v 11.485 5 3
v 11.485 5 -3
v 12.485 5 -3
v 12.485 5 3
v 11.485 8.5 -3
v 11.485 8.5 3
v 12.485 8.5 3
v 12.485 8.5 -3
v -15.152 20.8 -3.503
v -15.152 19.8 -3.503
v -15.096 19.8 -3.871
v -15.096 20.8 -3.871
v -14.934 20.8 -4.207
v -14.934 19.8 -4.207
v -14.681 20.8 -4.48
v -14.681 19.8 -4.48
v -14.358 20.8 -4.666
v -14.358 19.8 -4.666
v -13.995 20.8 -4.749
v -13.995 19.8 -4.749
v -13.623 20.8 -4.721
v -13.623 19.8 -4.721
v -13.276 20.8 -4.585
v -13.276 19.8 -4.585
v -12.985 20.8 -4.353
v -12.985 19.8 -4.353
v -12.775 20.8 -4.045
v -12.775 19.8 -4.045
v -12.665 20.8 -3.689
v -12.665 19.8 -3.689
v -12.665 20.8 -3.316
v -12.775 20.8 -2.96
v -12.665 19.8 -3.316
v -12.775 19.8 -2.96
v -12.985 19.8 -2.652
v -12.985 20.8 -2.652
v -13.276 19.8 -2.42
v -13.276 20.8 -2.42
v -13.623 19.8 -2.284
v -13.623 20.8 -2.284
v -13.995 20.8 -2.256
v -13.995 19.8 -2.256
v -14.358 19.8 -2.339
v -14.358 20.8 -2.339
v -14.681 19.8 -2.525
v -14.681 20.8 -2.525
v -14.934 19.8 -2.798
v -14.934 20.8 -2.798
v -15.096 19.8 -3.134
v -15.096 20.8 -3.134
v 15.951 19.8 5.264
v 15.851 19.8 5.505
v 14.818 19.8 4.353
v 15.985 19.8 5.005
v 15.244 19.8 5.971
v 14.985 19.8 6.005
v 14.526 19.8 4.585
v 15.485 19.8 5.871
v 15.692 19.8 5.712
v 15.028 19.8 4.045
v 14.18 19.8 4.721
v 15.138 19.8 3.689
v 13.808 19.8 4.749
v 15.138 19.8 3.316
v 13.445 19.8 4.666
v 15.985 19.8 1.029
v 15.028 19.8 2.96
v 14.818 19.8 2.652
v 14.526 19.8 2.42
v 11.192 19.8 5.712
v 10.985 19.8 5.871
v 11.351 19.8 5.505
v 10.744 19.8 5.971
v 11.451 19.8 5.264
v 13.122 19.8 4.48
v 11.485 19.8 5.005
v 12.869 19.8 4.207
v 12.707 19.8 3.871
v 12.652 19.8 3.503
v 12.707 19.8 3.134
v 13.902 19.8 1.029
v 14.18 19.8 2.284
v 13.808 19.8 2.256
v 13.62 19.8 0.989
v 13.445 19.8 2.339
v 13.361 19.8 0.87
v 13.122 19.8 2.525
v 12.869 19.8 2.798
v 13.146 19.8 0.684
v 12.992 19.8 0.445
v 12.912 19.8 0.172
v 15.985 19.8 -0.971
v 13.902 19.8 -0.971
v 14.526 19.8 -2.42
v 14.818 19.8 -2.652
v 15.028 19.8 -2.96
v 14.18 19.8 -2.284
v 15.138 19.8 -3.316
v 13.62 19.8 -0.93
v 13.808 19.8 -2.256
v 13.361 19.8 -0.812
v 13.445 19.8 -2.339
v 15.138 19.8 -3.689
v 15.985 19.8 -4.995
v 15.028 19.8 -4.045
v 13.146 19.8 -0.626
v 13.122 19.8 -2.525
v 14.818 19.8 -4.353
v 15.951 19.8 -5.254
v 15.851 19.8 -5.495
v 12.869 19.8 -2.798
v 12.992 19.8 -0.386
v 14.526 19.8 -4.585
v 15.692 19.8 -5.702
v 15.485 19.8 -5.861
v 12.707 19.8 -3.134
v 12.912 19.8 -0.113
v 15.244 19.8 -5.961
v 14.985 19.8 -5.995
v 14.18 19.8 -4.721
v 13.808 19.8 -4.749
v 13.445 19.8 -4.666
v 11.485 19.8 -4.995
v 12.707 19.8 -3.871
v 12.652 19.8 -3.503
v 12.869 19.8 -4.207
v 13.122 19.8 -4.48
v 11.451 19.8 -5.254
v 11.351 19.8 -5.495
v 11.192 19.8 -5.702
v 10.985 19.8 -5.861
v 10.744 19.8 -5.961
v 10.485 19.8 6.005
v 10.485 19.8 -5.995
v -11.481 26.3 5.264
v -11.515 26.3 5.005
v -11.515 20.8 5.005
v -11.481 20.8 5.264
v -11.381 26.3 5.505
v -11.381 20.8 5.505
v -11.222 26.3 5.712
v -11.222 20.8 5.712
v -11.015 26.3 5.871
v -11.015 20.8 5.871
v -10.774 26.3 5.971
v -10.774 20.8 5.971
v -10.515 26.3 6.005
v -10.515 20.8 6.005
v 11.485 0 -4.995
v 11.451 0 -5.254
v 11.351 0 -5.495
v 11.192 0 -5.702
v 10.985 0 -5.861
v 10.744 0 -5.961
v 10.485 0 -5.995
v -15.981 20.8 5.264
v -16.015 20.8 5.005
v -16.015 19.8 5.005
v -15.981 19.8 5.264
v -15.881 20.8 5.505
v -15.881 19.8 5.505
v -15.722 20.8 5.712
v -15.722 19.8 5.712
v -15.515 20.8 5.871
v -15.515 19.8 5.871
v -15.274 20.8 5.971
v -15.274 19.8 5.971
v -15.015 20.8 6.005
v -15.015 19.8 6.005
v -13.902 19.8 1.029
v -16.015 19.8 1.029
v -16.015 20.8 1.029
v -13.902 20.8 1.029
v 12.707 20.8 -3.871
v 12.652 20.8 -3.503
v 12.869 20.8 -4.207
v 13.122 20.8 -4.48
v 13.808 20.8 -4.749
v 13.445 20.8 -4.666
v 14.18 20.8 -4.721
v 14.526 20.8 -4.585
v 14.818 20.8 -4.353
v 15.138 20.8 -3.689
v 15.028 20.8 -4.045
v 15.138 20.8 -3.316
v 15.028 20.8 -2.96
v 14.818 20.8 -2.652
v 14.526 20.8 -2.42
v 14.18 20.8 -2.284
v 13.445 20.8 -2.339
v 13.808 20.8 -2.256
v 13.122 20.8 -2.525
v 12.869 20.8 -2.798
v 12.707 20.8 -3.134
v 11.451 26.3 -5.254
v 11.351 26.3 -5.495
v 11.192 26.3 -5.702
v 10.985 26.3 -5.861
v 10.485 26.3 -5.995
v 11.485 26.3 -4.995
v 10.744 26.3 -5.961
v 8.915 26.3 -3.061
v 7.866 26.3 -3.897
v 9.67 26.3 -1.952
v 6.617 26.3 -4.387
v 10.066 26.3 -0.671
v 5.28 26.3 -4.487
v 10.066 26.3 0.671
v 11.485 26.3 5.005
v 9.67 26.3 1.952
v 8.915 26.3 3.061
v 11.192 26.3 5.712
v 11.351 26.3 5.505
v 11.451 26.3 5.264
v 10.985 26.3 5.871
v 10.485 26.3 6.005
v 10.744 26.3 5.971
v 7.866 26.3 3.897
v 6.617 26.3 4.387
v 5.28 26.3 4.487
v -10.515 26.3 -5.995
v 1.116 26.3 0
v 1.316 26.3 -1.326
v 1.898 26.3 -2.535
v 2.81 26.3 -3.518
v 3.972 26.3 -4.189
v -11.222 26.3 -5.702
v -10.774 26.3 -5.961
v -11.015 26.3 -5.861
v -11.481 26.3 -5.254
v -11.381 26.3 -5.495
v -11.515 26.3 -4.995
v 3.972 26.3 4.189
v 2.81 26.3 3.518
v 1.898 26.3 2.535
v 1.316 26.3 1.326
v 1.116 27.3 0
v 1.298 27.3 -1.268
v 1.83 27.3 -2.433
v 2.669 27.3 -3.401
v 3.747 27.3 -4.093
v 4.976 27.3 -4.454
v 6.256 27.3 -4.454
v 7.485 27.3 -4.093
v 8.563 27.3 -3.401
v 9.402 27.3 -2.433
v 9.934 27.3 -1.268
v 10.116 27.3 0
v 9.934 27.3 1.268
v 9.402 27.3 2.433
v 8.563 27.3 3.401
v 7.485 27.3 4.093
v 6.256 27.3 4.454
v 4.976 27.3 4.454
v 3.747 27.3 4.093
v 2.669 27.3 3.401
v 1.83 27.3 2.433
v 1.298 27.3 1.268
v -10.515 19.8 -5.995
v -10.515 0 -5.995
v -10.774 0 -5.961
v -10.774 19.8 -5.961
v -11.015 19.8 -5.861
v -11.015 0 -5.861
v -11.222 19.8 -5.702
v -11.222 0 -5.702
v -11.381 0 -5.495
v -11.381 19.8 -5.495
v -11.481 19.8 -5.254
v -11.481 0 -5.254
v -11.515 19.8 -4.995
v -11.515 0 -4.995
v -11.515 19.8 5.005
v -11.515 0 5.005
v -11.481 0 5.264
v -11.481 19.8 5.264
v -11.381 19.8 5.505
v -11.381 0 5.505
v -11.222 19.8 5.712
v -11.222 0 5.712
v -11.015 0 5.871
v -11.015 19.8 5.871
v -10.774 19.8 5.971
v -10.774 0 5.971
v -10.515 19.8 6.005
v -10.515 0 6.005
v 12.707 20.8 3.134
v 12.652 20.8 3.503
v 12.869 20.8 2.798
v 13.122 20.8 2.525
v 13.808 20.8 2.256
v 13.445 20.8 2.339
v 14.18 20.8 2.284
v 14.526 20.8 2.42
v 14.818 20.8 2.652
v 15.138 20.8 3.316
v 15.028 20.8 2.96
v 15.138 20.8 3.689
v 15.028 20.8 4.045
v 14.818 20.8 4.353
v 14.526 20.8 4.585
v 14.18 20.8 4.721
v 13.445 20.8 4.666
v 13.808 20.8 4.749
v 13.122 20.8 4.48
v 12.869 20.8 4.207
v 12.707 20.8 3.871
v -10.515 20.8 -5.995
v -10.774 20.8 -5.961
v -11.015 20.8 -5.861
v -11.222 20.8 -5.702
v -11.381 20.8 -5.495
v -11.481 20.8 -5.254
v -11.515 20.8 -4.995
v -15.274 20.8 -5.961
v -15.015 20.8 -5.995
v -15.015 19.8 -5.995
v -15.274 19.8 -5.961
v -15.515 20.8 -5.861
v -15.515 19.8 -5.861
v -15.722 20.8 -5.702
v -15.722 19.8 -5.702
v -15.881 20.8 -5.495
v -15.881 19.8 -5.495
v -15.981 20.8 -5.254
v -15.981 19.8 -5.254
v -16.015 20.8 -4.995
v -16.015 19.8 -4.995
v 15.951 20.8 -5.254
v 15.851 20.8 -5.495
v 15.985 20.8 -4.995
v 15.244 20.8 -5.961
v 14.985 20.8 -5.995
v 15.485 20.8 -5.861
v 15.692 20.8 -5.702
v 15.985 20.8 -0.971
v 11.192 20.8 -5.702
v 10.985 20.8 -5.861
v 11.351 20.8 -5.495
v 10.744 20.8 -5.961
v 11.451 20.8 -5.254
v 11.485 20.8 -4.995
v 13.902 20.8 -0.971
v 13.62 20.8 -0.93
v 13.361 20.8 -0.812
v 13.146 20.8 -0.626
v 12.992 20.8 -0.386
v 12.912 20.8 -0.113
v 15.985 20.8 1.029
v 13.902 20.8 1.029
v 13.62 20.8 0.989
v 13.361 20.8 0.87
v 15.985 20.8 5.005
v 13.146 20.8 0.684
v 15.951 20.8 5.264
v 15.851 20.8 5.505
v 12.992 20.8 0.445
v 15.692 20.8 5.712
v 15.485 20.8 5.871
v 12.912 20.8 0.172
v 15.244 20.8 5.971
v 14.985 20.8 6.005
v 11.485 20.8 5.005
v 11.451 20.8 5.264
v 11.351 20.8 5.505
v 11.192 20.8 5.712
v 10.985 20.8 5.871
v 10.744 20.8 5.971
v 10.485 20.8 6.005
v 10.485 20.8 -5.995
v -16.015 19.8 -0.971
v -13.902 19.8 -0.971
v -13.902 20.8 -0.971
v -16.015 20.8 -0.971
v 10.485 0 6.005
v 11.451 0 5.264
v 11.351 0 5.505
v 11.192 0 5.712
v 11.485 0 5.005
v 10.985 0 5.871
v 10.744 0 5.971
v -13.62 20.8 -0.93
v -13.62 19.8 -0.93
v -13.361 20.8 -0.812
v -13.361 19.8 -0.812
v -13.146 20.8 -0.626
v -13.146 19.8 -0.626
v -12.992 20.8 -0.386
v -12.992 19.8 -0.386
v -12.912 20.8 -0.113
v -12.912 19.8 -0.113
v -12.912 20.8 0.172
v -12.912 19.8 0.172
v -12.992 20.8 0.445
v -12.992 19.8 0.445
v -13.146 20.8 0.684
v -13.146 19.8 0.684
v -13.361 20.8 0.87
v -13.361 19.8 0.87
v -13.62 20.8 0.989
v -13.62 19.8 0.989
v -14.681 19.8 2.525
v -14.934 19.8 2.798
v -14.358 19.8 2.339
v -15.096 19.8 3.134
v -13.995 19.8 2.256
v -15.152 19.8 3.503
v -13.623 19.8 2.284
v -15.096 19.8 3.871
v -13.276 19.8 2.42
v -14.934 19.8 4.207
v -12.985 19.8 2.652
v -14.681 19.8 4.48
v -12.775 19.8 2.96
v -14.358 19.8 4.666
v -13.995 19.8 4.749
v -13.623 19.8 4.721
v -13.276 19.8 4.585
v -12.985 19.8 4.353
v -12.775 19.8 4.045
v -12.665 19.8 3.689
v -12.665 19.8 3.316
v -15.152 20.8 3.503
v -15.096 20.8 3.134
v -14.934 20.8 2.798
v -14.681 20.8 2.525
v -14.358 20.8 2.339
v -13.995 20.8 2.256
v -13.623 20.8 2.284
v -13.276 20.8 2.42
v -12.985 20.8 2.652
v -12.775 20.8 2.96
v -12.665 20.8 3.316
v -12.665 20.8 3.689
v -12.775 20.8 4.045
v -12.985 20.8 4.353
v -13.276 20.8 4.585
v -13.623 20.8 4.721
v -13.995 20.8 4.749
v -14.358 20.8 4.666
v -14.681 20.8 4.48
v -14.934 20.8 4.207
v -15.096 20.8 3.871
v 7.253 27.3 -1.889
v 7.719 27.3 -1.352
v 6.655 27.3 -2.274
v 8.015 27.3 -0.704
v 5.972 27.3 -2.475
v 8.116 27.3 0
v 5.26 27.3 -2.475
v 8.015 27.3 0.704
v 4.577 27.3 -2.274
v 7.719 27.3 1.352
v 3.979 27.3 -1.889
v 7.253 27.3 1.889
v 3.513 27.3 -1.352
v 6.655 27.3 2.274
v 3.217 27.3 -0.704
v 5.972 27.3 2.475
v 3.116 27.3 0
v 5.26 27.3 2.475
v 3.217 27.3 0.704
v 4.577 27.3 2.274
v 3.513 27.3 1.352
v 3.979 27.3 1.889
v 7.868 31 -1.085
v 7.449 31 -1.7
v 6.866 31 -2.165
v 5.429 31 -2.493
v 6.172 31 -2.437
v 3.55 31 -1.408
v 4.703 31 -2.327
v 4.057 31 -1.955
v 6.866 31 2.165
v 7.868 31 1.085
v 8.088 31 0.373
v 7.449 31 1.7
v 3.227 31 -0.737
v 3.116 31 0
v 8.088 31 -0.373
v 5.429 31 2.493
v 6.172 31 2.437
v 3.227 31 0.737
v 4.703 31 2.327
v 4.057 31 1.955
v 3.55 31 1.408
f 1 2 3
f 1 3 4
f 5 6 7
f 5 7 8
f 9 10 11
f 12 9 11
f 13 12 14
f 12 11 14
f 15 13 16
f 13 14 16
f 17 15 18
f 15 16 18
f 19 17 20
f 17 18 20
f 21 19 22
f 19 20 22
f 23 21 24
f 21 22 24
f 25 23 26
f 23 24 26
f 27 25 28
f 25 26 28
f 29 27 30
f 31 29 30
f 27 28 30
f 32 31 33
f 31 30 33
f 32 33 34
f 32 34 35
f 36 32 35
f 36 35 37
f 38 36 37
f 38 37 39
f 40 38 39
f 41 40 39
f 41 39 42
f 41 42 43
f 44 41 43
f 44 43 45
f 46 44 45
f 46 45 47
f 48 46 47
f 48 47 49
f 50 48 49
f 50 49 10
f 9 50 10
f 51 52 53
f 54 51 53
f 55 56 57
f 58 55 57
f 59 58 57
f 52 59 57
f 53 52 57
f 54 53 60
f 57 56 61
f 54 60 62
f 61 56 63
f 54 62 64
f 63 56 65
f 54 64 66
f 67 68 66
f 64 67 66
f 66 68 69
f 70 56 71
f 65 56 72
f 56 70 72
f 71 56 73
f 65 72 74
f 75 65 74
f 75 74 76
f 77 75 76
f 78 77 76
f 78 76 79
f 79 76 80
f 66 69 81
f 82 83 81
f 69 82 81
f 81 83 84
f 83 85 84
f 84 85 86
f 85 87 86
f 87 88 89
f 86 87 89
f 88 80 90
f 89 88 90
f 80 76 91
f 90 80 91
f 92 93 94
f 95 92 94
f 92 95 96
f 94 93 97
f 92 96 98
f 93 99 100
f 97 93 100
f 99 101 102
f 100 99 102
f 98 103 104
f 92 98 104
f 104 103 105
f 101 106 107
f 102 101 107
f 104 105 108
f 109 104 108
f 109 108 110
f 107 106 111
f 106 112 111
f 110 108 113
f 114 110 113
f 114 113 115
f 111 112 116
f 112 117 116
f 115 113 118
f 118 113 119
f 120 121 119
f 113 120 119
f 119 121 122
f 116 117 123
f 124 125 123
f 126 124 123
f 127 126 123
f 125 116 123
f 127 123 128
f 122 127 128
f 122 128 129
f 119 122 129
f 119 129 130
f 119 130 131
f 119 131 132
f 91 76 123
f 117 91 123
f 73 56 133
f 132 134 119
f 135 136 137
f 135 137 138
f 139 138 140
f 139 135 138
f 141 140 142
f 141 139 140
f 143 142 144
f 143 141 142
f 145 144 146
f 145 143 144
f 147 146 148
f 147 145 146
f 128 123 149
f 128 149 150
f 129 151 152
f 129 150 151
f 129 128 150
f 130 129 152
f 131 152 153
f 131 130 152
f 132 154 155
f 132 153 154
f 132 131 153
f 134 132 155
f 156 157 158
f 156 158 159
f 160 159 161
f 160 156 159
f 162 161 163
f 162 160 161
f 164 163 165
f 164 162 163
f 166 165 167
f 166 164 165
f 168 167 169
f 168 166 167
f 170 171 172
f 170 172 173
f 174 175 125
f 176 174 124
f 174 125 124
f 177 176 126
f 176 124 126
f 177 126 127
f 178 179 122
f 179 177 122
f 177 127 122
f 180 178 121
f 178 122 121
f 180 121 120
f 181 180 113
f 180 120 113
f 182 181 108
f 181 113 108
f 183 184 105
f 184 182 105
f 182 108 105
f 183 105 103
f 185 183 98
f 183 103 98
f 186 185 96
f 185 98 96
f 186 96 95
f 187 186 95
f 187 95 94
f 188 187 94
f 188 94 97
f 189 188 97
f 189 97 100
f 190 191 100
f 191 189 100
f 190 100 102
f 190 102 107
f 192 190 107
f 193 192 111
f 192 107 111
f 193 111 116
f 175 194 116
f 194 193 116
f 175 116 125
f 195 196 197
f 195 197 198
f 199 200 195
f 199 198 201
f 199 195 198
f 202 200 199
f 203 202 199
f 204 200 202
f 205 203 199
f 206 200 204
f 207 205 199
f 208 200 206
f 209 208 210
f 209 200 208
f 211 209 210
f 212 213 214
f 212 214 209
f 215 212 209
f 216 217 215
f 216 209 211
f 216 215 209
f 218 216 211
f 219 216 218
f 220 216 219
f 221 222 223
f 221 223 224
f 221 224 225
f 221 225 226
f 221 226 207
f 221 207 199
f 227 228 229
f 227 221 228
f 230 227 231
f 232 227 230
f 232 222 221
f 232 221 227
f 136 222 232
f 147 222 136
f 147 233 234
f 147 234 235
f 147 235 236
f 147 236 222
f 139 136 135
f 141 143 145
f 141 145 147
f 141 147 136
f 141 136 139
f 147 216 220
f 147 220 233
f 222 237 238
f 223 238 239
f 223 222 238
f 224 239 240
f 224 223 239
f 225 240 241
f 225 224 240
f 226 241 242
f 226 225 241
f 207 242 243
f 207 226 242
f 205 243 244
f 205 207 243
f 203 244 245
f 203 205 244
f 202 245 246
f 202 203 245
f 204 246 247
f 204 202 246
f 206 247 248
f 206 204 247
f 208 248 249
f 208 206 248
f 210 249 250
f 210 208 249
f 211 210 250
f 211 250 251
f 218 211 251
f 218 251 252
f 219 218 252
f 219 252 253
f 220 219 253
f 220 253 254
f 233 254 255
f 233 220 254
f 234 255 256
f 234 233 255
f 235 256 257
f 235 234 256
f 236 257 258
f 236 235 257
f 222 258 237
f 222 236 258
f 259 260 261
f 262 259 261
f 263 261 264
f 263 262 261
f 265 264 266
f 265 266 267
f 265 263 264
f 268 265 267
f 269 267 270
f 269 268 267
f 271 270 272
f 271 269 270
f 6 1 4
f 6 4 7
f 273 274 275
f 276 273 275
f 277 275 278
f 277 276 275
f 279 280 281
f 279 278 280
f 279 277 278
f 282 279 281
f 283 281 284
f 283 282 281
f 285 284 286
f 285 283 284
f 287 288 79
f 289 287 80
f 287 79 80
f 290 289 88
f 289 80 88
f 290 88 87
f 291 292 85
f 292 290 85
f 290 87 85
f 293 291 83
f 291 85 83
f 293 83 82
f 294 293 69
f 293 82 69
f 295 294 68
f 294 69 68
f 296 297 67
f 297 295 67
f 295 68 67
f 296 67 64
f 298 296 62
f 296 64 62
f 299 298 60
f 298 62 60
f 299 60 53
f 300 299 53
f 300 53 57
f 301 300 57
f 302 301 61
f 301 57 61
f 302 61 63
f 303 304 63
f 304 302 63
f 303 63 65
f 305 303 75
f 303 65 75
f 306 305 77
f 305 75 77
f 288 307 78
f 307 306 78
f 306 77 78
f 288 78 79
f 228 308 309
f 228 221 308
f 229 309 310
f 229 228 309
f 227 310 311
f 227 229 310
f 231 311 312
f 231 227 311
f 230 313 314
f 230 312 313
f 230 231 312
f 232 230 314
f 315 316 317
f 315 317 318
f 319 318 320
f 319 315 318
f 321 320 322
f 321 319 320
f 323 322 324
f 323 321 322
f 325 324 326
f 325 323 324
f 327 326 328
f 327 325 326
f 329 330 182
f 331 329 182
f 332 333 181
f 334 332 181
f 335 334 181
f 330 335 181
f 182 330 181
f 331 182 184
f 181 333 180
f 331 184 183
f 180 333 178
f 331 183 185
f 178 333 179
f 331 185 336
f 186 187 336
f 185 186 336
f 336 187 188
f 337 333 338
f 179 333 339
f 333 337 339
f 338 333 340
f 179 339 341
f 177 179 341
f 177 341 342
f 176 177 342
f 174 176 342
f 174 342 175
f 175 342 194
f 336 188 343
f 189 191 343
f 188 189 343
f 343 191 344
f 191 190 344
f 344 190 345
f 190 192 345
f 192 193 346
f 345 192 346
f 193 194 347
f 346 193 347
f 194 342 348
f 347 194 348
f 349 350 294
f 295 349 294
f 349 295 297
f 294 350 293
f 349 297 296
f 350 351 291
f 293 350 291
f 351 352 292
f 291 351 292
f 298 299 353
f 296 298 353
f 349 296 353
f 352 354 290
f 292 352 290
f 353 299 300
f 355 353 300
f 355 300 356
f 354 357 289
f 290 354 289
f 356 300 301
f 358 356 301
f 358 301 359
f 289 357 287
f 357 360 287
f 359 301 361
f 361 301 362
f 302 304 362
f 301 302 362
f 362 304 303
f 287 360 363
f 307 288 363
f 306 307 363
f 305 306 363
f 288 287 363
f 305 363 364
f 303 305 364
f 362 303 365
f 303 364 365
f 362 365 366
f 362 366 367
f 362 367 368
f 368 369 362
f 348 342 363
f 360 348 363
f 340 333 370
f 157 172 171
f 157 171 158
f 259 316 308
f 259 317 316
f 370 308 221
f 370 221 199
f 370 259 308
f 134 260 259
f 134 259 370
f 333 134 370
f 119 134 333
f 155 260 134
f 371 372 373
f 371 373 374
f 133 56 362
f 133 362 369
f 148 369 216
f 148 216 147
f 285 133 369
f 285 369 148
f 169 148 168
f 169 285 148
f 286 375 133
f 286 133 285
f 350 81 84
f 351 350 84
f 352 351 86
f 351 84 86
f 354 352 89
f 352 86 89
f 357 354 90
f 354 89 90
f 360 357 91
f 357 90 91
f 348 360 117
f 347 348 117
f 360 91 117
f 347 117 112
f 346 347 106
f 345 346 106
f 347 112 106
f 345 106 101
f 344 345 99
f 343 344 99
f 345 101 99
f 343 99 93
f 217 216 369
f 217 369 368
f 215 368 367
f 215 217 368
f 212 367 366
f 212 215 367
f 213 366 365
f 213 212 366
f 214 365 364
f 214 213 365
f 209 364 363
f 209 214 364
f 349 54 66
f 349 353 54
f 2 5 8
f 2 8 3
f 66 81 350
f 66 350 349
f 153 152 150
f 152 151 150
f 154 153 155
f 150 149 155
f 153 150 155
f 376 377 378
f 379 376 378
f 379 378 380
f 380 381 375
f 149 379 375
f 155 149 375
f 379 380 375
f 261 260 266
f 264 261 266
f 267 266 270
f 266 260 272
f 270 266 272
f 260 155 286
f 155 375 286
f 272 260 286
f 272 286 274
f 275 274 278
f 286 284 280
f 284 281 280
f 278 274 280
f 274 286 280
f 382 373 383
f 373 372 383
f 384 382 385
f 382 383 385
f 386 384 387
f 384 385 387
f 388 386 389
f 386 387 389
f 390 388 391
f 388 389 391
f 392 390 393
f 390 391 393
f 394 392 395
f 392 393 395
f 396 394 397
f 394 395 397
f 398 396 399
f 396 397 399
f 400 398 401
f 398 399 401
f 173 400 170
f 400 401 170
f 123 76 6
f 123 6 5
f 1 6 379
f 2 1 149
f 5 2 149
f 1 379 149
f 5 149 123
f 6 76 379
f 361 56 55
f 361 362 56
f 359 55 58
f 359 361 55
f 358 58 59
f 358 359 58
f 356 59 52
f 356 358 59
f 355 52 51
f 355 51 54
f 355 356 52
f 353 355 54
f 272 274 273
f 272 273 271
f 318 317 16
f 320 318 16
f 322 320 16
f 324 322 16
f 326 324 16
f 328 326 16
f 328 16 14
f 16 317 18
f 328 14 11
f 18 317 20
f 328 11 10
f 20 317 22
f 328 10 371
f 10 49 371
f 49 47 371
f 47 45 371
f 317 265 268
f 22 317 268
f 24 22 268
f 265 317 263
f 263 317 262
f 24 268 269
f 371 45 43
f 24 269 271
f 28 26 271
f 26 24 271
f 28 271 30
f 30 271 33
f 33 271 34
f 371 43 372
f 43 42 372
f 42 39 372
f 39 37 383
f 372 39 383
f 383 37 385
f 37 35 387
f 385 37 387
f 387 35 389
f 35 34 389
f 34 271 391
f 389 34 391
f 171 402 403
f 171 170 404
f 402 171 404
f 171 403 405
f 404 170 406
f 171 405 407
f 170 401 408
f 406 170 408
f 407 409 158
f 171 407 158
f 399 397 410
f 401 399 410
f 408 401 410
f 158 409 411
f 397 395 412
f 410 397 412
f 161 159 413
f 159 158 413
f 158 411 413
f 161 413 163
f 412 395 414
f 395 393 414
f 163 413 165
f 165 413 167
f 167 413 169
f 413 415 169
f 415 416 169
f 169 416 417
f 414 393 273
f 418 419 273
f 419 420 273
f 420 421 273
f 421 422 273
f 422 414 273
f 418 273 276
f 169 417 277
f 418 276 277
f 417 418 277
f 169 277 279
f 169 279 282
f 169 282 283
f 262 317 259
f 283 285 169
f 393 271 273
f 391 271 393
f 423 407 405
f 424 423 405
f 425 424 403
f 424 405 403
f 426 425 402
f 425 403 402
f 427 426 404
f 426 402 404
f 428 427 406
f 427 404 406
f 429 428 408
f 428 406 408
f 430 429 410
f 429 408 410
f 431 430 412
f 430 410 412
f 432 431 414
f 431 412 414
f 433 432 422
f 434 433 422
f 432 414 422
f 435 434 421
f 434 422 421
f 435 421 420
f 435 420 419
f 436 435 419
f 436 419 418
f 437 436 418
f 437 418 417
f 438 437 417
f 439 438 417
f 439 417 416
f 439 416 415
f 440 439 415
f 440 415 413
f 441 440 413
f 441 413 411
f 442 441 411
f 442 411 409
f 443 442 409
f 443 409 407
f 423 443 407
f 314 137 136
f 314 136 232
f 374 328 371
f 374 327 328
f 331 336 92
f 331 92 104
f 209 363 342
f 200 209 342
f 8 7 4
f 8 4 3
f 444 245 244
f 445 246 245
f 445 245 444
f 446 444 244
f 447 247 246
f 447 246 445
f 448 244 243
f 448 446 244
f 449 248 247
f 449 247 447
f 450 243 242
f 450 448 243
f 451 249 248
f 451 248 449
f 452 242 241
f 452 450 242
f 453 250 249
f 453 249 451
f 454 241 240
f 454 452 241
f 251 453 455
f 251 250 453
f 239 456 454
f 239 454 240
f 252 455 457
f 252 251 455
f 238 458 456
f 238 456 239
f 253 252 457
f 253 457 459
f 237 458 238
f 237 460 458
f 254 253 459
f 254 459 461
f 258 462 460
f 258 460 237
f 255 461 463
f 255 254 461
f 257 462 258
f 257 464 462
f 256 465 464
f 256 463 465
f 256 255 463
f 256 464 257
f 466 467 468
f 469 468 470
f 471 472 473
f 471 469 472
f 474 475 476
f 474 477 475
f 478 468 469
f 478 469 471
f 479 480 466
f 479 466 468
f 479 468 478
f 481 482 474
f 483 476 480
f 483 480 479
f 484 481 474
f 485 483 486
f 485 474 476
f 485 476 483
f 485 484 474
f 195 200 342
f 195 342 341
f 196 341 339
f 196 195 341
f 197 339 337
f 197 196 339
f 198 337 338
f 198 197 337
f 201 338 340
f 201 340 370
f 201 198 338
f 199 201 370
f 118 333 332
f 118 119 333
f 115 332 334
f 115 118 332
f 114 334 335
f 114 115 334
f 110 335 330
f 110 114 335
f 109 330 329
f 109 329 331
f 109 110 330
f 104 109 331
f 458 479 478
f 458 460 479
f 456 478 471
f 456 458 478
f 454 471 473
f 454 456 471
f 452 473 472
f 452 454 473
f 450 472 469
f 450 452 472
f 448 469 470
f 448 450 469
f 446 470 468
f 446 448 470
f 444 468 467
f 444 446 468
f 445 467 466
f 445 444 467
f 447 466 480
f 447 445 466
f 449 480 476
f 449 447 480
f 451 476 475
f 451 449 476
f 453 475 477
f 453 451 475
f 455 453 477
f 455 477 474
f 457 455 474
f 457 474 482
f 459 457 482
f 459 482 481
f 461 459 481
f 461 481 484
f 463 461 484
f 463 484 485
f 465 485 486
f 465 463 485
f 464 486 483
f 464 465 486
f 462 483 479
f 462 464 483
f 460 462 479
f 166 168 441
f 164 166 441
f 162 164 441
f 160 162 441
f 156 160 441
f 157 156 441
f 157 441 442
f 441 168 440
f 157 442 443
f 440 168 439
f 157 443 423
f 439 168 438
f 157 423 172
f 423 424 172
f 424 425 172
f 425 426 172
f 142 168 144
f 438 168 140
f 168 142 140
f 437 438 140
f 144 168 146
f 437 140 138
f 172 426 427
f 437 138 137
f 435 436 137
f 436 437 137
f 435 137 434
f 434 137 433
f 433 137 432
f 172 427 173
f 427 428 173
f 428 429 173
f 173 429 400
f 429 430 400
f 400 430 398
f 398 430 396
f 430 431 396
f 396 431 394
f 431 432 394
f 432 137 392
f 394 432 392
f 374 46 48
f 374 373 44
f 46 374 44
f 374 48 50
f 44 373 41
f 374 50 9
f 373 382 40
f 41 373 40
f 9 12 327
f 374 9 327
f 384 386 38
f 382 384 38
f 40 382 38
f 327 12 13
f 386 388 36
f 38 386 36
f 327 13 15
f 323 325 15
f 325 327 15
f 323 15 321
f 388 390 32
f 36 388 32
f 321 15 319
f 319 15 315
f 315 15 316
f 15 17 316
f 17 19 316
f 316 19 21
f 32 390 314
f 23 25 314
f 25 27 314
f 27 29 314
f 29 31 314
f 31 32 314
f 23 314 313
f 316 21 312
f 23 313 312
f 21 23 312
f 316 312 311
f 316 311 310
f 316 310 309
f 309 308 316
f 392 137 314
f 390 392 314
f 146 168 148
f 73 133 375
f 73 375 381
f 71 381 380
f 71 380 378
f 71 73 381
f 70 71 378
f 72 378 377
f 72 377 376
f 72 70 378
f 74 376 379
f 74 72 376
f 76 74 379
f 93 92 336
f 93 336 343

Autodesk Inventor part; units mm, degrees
ref_plane "YZ Plane" through (0, 0, 0) normal (1, 0, 0) x (0, 1, 0)
ref_plane "XZ Plane" through (0, 0, 0) normal (0, 1, 0) x (-1, 0, 0)
ref_plane "XY Plane" through (0, 0, 0) normal (0, 0, 1) x (1, 0, 0)
sketch "Sketch1" plane through (0, 0, 0) normal (0, 0, 1) x (1, 0, 0)
  line L0 (-35.5537, 46.3091) -> (69.62, 46.3091) construction
  line L1 (69.62, 46.3091) -> (69.62, -40.915) construction
  line L2 (69.62, -40.915) -> (-35.5537, -40.915) construction
  line L3 (-35.5537, -40.915) -> (-35.5537, 46.3091) construction
  line L4 (-11.5, -3.1187) -> (11.5, -3.1187)
  point P0 (0, 0)
  point P1 (0, 0)
  dimension "d19" = 23
sketch "Sketch5" plane through (0, 0, 0) normal (0, 1, 0) x (-1, 0, 0)
  line L0 (-51.6883, 69.5392) -> (52.6581, 69.5392) construction
  line L1 (52.6581, 69.5392) -> (52.6581, -16.9988) construction
  line L2 (52.6581, -16.9988) -> (-51.6883, -16.9988) construction
  line L3 (-51.6883, -16.9988) -> (-51.6883, 69.5392) construction
  line L4 (16, 8.395) -> (-16, 8.395)
  circle A0 centre (-5.616, 0) radius 2.5
  circle A1 centre (-5.616, 0) radius 4.5
  circle A2 centre (-13.9015, 3.5026) radius 1.25
  line L5 (-5.616, 0) -> (-20.9236, 0)
  circle A3 centre (-13.9015, -3.5026) radius 1.25
  line L6 (0, 0) -> (0, -9.2667)
  circle A4 centre (13.9015, 3.5026) radius 1.25
  circle A5 centre (13.9015, -3.5026) radius 1.25
  line L7 (13.9015, -3.5026) -> (13.9015, 3.5026)
  arc A6 (13.9015, 1.0292) -> (13.9015, -0.9708) centre (13.9015, 0.0292) ccw
  line L8 (13.9015, -0.9708) -> (16.5074, -0.9708)
  line L9 (16.5074, 1.0292) -> (13.9015, 1.0292)
  line L10 (16.5074, -0.9708) -> (16.5074, 1.0292)
  point P0 (0, 8.395)
  dimension "d30" = 32
  dimension "d57" = 9
  dimension "d58" = 5
  dimension "d63" = 2.5
  dimension "d83" = 2
  dimension "d84" = 1
sketch "Sketch6" plane through (0, 0, 0) normal (0, 1, 0) x (-1, 0, 0)
  line L0 (11.515, 6.0048) -> (11.515, -5.9952)
  line L1 (11.515, 0.0048) -> (-11.485, 0.0048)
  line L2 (11.515, -5.9952) -> (11.515, 6.0048)
  line L3 (-11.485, 6.0048) -> (-11.485, -5.9952)
  line L4 (11.515, -5.9952) -> (-11.485, -5.9952)
  line L5 (-11.485, 6.0048) -> (11.515, 6.0048)
  point P0 (0, 0)
  point P1 (9.3248, 11.448)
  point P2 (-11.485, 0.0048)
  dimension "d42" = 12
  dimension "d43" = 23
  dimension "d44" = 12
extrude "Extrusion1" add sketch "Sketch6" along normal blind 26.3
extrude "Extrusion2" add sketch "Sketch5" along normal blind 1 from surface at 26.3 contours A0 | A1
sketch "Sketch7" plane through (-11.515, 0, -5.9952) normal (-1, 0, 0) x (0, 0, 1)
  line L0 (5.9952, 0) -> (5.9952, 19.8)
  line L1 (5.9952, 19.8) -> (5.9952, 20.8)
  line L2 (0, 0) -> (0, 26.3) projected
  line L3 (0, 19.8) -> (12, 19.8)
  line L4 (12, 0) -> (12, 26.3) projected
  line L5 (12, 20.8) -> (0, 20.8)
  line L6 (0, 20.8) -> (0, 19.8)
  dimension "d49" = 19.8
  dimension "d50" = 1
extrude "Extrusion3" add sketch "Sketch7" along normal blind 4.5
sketch "Sketch8" plane through (11.485, 0, 6.0048) normal (1, 0, 0) x (0, 0, -1)
  line L0 (6.0048, 0) -> (6.0048, 19.8)
  line L1 (6.0048, 19.8) -> (6.0048, 20.8)
  line L2 (0, 0) -> (0, 26.3) projected
  line L3 (0, 19.7999) -> (12, 19.7999)
  line L4 (12, 20.8) -> (12, 19.8) projected
  line L5 (12, 19.7999) -> (12, 20.8)
  line L6 (12, 20.8) -> (0, 20.8)
  line L7 (0, 20.8) -> (0, 19.7999)
  dimension "d53" = 19.8
  dimension "d54" = 1
extrude "Extrusion4" add sketch "Sketch8" along normal blind 4.5
extrude "Extrusion5" add sketch "Sketch5" along normal blind 3.7 from surface at 27.3 contours A0
fillet "Fillet1" radius 1 12 edges at (11.485, 9.8999, 6.0048) (11.485, 9.8999, -5.9952) (-11.515, 9.9, -5.9952) (-11.515, 23.55, -5.9952) (-11.515, 23.55, 6.0048) (-11.515, 9.9, 6.0048) (-16.015, 20.3, 6.0048) (-16.015, 20.3, -5.9952) (11.485, 23.55, -5.9952) (15.985, 20.2999, -5.9952) (15.985, 20.2999, 6.0048) (11.485, 23.55, 6.0048)
extrude "Extrusion6" cut sketch "Sketch5" along normal up to surface (20.8 mm away) contours A2
extrude "Extrusion7" cut sketch "Sketch5" along normal up to surface (20.8 mm away) contours A3
extrude "Extrusion8" cut sketch "Sketch5" along normal up to surface (20.8 mm away) contours A4
extrude "Extrusion9" cut sketch "Sketch5" along normal up to surface (20.8 mm away) contours A5
sketch "Sketch9" plane through (11.485, 0, 5.0048) normal (1, 0, 0) x (0, 0, -1)
  line L0 (10, 26.3) -> (10, 20.8) projected
  line L1 (11, 0) -> (10, 0) projected
  line L2 (10, 26.3) -> (10, 0)
  line L3 (10, 19.7999) -> (10, 0) projected
  line L4 (0, 0) -> (0, 19.7999) projected
  line L5 (5.0048, 0) -> (5.0048, 5)
  line L6 (5.0048, 5) -> (5.0048, 8.5)
  line L7 (5.0048, 5) -> (8.0048, 5)
  line L8 (5.0048, 5) -> (2.0048, 5)
  line L9 (2.0048, 5) -> (2.0048, 8.5)
  line L10 (2.0048, 8.5) -> (8.0048, 8.5)
  line L11 (8.0048, 8.5) -> (8.0048, 5)
  dimension "d76" = 26.3
  dimension "d77" = 5
  dimension "d78" = 3.5
  dimension "d79" = 3
extrude "Extrusion10" add sketch "Sketch9" along normal blind 1
extrude "Extrusion11" cut sketch "Sketch5" along normal up to surface (20.8 mm away) contours L9 L10 L8 L7 | L7 A6
mirror "Spiegeln1" about plane through (0, 0, 0) normal (1, 0, 0) of "Extrusion11"
ref_plane "Arbeitsebene1" through (0, 0, 0) normal (1, 0, 0) x (0, 1, 0)
properties part number "servo_alzrc_ds452mg" material "Thermoplastic Resin"
